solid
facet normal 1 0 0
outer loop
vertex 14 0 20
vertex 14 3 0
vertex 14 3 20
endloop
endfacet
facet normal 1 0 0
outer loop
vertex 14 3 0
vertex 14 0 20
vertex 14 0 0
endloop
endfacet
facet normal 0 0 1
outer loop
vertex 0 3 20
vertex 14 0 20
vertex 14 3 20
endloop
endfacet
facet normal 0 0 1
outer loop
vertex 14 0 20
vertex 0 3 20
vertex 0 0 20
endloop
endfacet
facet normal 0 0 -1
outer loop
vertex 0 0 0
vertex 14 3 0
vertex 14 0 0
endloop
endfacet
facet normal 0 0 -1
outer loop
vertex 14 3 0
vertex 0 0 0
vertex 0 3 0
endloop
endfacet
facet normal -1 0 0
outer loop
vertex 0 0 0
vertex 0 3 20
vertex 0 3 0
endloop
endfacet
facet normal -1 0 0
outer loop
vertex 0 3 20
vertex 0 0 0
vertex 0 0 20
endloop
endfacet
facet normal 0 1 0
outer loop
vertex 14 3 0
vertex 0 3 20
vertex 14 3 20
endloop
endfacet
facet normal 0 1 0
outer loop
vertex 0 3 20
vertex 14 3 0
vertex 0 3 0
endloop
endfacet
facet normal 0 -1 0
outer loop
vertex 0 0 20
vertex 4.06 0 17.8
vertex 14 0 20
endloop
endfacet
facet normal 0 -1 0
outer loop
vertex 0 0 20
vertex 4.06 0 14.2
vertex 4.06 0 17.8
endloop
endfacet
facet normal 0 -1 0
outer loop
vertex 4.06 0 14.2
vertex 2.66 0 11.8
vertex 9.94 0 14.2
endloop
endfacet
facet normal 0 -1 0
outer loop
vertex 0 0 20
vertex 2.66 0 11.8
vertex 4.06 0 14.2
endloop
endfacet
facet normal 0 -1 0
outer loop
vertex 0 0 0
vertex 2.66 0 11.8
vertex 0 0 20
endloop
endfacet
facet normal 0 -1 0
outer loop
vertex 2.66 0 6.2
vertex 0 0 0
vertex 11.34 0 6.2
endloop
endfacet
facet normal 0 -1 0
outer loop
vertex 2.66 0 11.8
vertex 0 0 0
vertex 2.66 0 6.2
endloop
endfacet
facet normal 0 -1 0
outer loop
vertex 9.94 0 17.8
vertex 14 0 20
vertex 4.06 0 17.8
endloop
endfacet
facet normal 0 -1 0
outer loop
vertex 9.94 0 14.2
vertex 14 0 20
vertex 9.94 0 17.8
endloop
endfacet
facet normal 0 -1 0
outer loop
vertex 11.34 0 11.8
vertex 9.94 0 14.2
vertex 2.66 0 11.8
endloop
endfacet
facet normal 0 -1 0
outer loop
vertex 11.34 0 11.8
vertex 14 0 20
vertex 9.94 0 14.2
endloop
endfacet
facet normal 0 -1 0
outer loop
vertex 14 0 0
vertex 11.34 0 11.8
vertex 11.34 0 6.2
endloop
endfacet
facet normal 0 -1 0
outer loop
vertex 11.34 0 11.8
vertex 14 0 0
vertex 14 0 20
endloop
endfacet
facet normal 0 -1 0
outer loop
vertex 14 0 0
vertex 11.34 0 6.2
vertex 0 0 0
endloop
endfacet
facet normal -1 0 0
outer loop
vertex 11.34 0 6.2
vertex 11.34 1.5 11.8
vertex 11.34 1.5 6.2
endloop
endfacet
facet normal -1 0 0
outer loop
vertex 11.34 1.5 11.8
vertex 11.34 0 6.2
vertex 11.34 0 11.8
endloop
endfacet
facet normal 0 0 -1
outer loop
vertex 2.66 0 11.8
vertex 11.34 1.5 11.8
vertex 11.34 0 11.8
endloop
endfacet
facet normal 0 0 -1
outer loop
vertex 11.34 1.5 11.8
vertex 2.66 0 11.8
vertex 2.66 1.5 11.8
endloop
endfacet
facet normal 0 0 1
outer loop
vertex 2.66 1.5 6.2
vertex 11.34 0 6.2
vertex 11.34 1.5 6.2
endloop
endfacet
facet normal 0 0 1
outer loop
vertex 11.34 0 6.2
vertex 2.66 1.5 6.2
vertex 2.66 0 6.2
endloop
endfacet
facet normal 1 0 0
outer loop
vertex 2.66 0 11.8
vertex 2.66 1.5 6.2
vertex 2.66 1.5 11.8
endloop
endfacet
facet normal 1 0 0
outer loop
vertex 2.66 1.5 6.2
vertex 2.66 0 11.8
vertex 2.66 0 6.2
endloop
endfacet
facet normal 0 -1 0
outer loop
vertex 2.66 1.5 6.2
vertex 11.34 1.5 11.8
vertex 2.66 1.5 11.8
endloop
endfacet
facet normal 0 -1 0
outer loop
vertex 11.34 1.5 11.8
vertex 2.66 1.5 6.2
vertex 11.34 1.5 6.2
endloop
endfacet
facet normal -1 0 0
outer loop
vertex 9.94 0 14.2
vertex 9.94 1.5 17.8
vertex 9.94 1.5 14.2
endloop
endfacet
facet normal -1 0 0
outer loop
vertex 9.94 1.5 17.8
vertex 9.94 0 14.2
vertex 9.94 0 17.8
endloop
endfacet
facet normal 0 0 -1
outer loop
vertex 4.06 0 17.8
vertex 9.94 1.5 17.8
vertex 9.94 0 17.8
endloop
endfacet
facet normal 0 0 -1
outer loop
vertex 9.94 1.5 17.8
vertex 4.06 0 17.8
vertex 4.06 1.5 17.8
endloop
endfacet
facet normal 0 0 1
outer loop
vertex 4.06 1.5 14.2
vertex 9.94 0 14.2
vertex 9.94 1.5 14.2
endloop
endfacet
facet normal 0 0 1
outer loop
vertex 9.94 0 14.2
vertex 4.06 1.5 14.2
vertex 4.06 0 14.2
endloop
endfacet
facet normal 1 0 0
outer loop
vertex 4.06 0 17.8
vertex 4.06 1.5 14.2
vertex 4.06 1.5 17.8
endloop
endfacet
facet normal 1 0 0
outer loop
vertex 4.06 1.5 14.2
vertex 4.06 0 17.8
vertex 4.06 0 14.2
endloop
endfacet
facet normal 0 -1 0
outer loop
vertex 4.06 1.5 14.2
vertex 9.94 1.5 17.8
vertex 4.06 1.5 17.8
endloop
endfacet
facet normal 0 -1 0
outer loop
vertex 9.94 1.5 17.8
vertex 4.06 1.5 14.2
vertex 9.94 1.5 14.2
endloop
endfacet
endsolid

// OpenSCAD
// DIN-rail retaining clip.
$fn = 60;
eps = 0.02;
clip_w = 14;
clip_h = 20;
clip_t = 3;
difference() { cube([clip_w,clip_t,clip_h]); translate([clip_w/2, -eps, clip_h*0.45]) cube([clip_w*0.62,clip_t+2*eps,clip_h*0.28],center=true); translate([clip_w/2, -eps, clip_h*0.8]) cube([clip_w*0.42,clip_t+2*eps,clip_h*0.18],center=true); }
